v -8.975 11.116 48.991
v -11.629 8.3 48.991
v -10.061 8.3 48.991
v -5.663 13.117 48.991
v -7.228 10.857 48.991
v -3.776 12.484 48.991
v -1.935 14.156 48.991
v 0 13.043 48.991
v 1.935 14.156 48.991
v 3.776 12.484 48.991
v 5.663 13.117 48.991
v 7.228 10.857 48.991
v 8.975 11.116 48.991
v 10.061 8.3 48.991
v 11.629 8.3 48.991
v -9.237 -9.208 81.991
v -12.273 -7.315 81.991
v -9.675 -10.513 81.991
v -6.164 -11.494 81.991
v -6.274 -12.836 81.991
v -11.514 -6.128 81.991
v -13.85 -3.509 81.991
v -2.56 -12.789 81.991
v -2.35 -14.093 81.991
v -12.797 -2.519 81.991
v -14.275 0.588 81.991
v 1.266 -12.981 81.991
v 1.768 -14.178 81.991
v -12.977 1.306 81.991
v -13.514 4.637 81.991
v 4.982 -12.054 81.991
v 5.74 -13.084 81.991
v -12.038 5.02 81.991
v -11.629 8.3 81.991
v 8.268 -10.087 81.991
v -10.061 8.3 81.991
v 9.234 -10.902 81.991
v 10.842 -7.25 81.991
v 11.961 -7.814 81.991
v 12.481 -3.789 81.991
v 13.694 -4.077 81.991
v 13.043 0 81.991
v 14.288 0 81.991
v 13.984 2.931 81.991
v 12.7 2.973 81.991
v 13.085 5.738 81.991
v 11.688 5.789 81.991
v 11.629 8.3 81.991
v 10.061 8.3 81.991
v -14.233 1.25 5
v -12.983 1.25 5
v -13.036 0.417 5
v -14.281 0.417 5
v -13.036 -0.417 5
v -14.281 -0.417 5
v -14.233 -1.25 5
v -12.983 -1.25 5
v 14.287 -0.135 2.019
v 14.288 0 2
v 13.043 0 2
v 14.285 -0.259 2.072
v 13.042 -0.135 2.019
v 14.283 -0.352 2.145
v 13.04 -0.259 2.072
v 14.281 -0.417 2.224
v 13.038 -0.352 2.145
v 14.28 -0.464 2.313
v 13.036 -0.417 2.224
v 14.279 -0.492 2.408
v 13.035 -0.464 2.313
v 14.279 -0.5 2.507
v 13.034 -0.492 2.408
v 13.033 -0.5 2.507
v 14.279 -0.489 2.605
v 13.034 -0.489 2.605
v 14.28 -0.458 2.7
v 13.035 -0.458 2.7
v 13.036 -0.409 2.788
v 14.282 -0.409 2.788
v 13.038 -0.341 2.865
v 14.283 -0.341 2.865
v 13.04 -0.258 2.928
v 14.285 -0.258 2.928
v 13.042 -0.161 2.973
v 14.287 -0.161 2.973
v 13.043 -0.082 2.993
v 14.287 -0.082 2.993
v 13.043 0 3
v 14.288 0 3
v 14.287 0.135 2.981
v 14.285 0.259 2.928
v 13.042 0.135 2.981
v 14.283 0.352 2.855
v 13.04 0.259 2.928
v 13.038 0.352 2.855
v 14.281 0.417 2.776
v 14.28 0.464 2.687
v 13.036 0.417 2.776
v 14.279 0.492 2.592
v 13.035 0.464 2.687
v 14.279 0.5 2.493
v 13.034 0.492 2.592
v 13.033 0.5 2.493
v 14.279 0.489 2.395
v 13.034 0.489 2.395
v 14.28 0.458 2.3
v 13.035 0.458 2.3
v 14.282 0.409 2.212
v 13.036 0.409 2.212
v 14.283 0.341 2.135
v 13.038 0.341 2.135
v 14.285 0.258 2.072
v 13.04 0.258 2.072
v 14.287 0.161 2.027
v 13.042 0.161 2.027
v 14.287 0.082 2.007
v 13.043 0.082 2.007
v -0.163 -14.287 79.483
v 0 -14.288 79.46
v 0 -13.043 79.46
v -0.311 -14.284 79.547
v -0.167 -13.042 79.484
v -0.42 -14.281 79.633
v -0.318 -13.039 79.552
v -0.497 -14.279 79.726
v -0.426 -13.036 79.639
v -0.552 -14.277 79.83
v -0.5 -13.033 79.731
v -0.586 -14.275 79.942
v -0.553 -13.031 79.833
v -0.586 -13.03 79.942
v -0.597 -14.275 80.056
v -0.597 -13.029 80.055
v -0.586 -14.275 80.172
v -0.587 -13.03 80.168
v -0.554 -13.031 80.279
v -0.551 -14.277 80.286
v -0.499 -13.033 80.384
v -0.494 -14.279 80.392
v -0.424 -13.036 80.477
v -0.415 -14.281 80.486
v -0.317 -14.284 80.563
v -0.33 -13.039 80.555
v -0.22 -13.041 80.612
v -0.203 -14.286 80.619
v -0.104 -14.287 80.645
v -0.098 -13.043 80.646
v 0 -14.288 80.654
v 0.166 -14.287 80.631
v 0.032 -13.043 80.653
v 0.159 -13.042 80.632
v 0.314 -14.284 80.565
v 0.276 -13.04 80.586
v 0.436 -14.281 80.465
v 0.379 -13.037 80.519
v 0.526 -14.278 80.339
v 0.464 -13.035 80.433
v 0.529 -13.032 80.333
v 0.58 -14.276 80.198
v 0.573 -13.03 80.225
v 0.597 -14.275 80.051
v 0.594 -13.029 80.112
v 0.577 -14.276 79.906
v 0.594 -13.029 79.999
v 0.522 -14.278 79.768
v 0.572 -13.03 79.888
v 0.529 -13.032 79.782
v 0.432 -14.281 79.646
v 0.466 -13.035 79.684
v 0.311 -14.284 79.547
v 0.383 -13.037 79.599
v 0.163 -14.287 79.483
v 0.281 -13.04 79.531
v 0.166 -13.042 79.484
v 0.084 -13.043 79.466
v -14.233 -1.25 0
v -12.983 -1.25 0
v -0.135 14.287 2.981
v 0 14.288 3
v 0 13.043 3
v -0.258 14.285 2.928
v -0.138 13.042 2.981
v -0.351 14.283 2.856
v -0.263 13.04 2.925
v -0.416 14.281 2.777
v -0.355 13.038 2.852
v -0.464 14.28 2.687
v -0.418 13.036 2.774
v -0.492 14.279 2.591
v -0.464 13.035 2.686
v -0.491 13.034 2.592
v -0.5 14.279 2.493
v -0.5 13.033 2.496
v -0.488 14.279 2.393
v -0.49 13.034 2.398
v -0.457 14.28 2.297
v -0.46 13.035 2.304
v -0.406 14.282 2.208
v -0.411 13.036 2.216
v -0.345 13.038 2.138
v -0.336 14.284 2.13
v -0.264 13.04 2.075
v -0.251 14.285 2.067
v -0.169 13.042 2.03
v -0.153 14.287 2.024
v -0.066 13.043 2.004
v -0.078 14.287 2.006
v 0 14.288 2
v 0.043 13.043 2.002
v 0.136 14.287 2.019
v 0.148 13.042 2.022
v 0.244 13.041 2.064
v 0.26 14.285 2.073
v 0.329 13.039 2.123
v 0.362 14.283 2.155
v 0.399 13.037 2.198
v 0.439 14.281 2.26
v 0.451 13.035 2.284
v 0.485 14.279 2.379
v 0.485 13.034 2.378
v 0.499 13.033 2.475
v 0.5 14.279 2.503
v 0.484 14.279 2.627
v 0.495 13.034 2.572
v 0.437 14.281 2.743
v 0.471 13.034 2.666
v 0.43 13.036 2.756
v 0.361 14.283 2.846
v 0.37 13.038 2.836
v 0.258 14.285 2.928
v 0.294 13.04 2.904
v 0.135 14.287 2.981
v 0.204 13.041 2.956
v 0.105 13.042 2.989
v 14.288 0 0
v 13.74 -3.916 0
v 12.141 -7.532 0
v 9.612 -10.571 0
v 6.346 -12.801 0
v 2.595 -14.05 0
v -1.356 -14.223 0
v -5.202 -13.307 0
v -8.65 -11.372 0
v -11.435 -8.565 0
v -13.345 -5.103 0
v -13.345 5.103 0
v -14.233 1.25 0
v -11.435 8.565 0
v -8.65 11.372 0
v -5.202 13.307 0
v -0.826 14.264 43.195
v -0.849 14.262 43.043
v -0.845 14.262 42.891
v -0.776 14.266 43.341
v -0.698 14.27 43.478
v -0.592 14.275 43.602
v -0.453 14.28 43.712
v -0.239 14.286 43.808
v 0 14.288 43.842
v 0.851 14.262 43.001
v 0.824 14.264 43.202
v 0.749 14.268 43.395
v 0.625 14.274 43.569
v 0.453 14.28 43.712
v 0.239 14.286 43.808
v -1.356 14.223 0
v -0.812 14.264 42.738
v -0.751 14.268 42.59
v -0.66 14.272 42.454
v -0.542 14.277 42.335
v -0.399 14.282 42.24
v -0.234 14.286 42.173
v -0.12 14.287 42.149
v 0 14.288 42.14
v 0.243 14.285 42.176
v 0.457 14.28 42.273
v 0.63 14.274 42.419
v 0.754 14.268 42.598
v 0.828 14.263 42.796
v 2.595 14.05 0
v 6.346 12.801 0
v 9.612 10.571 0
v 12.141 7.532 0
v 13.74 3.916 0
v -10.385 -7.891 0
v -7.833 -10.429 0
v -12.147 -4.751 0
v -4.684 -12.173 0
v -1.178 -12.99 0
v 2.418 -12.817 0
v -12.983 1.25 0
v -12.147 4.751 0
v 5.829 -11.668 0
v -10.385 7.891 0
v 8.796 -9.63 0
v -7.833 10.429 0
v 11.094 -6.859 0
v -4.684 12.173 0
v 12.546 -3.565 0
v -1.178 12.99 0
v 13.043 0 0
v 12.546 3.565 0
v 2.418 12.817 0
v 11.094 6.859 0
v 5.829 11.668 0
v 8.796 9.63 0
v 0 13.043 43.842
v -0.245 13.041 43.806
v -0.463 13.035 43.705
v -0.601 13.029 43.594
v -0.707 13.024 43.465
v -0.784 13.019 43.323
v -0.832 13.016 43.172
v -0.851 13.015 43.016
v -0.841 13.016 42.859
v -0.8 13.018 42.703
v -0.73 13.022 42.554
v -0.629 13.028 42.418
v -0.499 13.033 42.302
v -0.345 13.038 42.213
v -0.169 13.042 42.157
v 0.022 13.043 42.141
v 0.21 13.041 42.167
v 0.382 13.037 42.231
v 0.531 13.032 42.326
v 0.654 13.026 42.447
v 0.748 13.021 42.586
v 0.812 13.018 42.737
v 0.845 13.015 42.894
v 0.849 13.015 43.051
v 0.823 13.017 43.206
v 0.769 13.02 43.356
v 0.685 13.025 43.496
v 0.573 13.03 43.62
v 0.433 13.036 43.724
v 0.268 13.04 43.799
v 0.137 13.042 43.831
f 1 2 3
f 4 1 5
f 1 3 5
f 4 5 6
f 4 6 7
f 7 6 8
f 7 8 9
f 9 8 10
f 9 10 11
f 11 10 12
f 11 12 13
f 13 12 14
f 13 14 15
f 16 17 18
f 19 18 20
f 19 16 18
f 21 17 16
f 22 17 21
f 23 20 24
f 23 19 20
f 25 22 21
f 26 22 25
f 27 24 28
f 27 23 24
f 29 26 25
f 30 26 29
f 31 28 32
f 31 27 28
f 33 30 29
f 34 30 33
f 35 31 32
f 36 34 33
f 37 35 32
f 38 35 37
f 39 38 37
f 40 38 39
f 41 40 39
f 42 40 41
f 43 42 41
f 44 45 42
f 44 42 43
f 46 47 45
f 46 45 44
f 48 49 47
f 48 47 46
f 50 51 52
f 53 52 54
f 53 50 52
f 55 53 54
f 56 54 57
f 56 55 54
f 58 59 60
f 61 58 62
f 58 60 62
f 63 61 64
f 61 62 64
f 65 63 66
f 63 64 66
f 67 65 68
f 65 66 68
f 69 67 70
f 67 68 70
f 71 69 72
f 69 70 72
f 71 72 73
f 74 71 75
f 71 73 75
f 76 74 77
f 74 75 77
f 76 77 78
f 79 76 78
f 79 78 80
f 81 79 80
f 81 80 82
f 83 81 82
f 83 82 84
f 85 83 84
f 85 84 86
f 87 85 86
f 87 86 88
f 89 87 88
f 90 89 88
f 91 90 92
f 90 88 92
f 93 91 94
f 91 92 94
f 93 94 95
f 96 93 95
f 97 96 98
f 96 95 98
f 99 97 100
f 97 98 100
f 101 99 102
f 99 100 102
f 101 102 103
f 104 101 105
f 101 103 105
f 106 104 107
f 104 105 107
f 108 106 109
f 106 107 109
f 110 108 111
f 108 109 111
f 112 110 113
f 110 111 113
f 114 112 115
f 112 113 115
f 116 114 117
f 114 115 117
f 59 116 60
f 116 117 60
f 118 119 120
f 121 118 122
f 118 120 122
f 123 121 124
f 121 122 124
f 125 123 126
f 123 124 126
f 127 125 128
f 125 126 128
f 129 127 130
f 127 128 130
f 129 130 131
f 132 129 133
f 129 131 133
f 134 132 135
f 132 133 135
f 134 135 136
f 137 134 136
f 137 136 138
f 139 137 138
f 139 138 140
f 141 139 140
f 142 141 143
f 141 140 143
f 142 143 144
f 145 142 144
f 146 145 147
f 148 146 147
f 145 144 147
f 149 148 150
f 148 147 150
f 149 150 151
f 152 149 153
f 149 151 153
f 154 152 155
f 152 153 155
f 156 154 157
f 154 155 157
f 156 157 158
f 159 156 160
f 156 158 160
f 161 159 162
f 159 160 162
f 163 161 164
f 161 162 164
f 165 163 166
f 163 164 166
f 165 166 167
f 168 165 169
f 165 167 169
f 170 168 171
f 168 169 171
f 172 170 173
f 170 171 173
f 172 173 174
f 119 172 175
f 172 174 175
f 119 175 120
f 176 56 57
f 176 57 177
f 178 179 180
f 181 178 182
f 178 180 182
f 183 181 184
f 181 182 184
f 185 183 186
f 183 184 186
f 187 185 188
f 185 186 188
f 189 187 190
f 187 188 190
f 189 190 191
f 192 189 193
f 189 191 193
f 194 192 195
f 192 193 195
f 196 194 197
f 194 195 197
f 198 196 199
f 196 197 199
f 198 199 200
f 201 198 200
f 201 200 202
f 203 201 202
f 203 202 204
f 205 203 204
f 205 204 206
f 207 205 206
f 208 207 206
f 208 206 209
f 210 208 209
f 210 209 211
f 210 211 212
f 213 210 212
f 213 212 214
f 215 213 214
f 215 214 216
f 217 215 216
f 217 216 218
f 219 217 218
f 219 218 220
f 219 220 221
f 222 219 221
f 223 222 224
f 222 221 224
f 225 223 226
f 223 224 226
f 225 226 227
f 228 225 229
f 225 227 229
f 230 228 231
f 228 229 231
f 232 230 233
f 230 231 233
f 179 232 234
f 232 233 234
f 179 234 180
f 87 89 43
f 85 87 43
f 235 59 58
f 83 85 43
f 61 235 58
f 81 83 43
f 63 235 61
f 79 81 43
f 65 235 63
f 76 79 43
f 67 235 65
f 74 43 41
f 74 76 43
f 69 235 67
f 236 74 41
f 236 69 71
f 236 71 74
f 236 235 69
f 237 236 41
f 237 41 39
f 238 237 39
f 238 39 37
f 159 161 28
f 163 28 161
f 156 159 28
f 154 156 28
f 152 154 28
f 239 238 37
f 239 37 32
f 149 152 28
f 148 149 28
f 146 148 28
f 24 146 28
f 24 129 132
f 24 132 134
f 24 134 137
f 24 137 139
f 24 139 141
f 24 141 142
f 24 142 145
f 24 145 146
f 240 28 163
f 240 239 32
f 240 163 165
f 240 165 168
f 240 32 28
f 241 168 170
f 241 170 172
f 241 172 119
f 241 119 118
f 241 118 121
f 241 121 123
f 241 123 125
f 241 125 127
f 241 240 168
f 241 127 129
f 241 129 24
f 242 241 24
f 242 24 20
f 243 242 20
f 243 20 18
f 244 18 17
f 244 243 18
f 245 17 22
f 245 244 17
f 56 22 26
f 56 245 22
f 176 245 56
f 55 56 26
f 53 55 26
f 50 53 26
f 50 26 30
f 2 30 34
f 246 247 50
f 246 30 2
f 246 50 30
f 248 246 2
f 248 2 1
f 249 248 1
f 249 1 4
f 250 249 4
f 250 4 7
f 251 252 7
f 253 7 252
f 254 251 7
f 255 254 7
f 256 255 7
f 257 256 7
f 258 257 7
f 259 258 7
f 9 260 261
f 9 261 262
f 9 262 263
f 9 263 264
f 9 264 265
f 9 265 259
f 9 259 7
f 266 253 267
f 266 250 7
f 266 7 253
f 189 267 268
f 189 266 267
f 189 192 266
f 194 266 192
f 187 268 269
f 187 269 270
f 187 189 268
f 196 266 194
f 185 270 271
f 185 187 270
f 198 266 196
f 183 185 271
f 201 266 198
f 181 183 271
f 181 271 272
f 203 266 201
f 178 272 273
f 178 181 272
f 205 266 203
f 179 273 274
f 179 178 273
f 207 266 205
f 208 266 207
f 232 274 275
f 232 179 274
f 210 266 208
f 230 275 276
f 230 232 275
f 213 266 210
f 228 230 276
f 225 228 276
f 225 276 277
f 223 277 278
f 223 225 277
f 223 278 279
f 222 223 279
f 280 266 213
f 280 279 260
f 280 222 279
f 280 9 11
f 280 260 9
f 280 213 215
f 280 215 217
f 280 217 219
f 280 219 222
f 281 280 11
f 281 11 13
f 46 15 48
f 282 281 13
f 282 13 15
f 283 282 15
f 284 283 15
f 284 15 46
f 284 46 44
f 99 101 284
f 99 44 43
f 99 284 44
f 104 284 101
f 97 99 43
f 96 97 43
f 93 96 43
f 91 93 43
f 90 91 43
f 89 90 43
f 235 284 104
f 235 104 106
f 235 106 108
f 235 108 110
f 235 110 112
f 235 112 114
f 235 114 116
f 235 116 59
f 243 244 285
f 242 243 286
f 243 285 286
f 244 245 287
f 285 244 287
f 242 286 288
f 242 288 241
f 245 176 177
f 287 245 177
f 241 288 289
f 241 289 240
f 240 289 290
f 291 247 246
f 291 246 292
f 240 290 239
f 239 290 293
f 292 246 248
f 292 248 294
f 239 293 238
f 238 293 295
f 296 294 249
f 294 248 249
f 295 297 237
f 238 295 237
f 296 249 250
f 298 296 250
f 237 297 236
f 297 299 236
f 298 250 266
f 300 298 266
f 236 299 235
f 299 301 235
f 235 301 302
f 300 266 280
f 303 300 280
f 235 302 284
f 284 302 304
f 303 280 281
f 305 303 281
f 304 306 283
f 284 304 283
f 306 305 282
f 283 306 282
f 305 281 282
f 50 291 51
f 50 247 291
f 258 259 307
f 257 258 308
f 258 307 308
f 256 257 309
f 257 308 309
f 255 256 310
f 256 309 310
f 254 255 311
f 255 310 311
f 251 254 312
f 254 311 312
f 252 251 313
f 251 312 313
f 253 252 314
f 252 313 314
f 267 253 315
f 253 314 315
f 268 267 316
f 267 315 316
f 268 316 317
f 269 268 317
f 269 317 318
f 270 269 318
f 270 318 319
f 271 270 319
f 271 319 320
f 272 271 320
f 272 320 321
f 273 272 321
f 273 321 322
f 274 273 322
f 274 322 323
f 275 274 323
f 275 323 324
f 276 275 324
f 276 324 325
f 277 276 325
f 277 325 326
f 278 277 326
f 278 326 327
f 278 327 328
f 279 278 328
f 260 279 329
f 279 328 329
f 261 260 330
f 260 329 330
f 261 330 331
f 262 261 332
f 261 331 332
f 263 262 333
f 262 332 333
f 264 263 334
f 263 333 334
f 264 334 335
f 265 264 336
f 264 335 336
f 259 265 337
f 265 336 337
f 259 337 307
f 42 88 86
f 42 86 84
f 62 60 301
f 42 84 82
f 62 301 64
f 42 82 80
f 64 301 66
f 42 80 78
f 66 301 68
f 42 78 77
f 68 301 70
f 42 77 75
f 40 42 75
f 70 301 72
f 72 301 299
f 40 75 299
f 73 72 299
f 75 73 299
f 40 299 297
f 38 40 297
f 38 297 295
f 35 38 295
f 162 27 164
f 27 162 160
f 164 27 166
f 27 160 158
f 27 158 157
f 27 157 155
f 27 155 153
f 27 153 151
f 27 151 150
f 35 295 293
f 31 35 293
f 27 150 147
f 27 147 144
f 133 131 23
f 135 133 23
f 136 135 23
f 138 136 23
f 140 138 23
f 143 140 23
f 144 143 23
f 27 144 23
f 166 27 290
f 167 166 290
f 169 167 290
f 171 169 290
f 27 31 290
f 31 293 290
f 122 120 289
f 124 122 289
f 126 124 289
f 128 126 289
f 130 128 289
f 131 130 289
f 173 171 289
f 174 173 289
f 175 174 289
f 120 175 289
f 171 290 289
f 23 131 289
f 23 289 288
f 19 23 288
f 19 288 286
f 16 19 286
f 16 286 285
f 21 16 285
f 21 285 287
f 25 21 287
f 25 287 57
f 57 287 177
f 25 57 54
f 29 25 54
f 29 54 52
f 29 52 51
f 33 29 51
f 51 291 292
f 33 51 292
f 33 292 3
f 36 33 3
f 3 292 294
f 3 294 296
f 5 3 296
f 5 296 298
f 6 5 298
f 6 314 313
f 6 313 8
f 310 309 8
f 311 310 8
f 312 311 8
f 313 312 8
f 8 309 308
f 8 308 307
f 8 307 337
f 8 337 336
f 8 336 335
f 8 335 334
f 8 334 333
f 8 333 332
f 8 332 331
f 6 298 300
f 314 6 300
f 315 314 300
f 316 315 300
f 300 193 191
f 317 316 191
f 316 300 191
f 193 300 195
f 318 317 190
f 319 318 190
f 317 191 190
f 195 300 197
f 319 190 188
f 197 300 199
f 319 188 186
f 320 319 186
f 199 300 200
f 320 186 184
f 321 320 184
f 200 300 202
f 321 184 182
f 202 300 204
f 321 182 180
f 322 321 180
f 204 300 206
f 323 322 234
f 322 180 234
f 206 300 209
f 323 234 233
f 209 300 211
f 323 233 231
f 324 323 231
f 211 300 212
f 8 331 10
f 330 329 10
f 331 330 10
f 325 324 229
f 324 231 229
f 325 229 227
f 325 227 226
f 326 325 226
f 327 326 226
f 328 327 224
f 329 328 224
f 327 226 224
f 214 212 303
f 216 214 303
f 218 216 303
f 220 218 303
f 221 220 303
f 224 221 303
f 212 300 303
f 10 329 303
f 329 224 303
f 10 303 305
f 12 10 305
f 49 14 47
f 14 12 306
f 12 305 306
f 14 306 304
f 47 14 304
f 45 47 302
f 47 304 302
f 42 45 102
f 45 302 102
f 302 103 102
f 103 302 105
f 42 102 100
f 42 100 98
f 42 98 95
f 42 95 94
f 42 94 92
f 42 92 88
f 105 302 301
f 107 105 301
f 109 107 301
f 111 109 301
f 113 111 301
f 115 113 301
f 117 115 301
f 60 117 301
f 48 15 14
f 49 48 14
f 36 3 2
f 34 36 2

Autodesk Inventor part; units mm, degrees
sketch "Sketch1" plane through (0, 0, 0) normal (0, 0, 1) x (1, 0, 0)
  circle A0 centre (0, 0) radius 14.2875
  circle A1 centre (0, 0) radius 13.0429
  dimension "d0" = 28.575
  dimension "d1" = 26.0858
extrude "Extrusion1" add sketch "Sketch1" along normal blind 81.9912
ref_plane "POffset" through (0, 8.3, 0) normal (0, 1, 0) x (-1, 0, 0)
sketch "Sketch2" plane through (0, 8.3, 0) normal (0, 1, 0) x (-1, 0, 0)
  line L0 (11.6294, 81.9912) -> (11.6294, 0) projected
  line L1 (11.6294, 0) -> (10.0612, 0) projected
  line L2 (10.0612, 0) -> (10.0612, 81.9912) projected
  line L3 (10.0612, 81.9912) -> (11.6294, 81.9912) projected
  line L4 (-11.6294, 0) -> (-11.6294, 81.9912) projected
  line L5 (-11.6294, 81.9912) -> (-10.0612, 81.9912) projected
  line L6 (-10.0612, 81.9912) -> (-10.0612, 0) projected
  line L7 (-10.0612, 0) -> (-11.6294, 0) projected
  line L8 (-11.6294, 81.9912) -> (11.6294, 81.9912)
  line L9 (11.6294, 81.9912) -> (11.6294, 48.9912)
  line L10 (11.6294, 48.9912) -> (-11.6294, 48.9912)
  line L11 (-11.6294, 48.9912) -> (-11.6294, 81.9912)
  point P0 (0, 0)
  dimension "d5" = 33
extrude "Extrusion2" cut sketch "Sketch2" along normal through all contours L0 L10 L2 L3 | L2 L10 L6 L8 | L6 L10 L4 L5
ref_plane "Work Plane2" through (0, 14.2875, 0) normal (0, 1, 0) x (-1, 0, 0)
sketch "Sketch3" plane through (0, 14.2875, 0) normal (0, 1, 0) x (-1, 0, 0)
  line L0 (-14.2875, 0) -> (14.2875, 0) projected
  line L1 (0, -16.3982) -> (0, 98.3894) projected
  point P0 (0, 0)
  point P1 (0, 2.5)
  dimension "d8" = 2.5
hole "Hole1" at (0, 14.2875, 2.5) direction (0, -1, 0) diameter 1 end up to surface
ref_plane "Work Plane3" through (14.2875, 0, 0) normal (1, 0, 0) x (0, 1, 0)
sketch "Sketch4" plane through (14.2875, 0, 0) normal (1, 0, 0) x (0, 1, 0)
  line L0 (-14.2875, 0) -> (14.2875, 0) projected
  line L1 (0, -16.3982) -> (0, 98.3894) projected
  point P0 (0, 0)
  point P1 (0, 2.5)
  dimension "d16" = 2.5
hole "Hole2" at (14.2875, 0, 2.5) direction (-1, 0, 0) diameter 1 end up to surface
ref_plane "Work Plane4" through (-14.2875, 0, 0) normal (1, 0, 0) x (0, 1, 0)
sketch "Sketch5" plane through (-14.2875, 0, 0) normal (1, 0, 0) x (0, 1, 0)
  line L0 (-14.2875, 0) -> (14.2875, 0) projected
  line L1 (0, -16.3982) -> (0, 98.3894) projected
  line L2 (1.25, 5) -> (-1.25, 5)
  line L3 (-1.25, 5) -> (-1.25, 0)
  line L4 (-1.25, 0) -> (1.25, 0)
  line L5 (1.25, 0) -> (1.25, 5)
  point P0 (0, 0)
  point P1 (0, 5)
  point P2 (0, 0)
  dimension "d24" = 2.5
  dimension "d25" = 5
extrude "Extrusion3" cut sketch "Sketch5" along normal blind 3
ref_plane "Work Plane5" through (0, -14.2875, 0) normal (0, 1, 0) x (-1, 0, 0)
sketch "Sketch6" plane through (0, -14.2875, 0) normal (0, 1, 0) x (-1, 0, 0)
  line L0 (-13.0429, 81.9912) -> (13.0429, 81.9912) projected
  line L1 (0, -16.3982) -> (0, 98.3894) projected
  point P0 (0, 0)
  point P1 (-10.0612, 81.9912)
  point P2 (10.0612, 81.9912)
  point P3 (0, 80.0572)
  dimension "d28" = 1.934
hole "Hole3" at (0, -14.2875, 80.0572) direction (0, 1, 0) diameter 1.1938 end through all
sketch "Sketch7" plane through (0, 14.2875, 0) normal (0, 1, 0) x (-1, 0, 0)
  line L0 (-13.0429, 81.9912) -> (13.0429, 81.9912) projected
  line L1 (0, -16.3982) -> (0, 98.3894) projected
  point P0 (0, 0)
  point P1 (-10.0612, 81.9912)
  point P2 (10.0612, 81.9912)
  point P3 (0, 42.9912)
  dimension "d36" = 39
hole "Hole4" at (0, 14.2875, 42.9912) direction (0, -1, 0) diameter 1.7018 depth 3
equation "\"d5\" = length"
equation "\"POffset\" = 8.3"
equation "\"d4\" = POffset"
equation "\"length\" = 33"
properties part number "Main_Tubing_Al"
